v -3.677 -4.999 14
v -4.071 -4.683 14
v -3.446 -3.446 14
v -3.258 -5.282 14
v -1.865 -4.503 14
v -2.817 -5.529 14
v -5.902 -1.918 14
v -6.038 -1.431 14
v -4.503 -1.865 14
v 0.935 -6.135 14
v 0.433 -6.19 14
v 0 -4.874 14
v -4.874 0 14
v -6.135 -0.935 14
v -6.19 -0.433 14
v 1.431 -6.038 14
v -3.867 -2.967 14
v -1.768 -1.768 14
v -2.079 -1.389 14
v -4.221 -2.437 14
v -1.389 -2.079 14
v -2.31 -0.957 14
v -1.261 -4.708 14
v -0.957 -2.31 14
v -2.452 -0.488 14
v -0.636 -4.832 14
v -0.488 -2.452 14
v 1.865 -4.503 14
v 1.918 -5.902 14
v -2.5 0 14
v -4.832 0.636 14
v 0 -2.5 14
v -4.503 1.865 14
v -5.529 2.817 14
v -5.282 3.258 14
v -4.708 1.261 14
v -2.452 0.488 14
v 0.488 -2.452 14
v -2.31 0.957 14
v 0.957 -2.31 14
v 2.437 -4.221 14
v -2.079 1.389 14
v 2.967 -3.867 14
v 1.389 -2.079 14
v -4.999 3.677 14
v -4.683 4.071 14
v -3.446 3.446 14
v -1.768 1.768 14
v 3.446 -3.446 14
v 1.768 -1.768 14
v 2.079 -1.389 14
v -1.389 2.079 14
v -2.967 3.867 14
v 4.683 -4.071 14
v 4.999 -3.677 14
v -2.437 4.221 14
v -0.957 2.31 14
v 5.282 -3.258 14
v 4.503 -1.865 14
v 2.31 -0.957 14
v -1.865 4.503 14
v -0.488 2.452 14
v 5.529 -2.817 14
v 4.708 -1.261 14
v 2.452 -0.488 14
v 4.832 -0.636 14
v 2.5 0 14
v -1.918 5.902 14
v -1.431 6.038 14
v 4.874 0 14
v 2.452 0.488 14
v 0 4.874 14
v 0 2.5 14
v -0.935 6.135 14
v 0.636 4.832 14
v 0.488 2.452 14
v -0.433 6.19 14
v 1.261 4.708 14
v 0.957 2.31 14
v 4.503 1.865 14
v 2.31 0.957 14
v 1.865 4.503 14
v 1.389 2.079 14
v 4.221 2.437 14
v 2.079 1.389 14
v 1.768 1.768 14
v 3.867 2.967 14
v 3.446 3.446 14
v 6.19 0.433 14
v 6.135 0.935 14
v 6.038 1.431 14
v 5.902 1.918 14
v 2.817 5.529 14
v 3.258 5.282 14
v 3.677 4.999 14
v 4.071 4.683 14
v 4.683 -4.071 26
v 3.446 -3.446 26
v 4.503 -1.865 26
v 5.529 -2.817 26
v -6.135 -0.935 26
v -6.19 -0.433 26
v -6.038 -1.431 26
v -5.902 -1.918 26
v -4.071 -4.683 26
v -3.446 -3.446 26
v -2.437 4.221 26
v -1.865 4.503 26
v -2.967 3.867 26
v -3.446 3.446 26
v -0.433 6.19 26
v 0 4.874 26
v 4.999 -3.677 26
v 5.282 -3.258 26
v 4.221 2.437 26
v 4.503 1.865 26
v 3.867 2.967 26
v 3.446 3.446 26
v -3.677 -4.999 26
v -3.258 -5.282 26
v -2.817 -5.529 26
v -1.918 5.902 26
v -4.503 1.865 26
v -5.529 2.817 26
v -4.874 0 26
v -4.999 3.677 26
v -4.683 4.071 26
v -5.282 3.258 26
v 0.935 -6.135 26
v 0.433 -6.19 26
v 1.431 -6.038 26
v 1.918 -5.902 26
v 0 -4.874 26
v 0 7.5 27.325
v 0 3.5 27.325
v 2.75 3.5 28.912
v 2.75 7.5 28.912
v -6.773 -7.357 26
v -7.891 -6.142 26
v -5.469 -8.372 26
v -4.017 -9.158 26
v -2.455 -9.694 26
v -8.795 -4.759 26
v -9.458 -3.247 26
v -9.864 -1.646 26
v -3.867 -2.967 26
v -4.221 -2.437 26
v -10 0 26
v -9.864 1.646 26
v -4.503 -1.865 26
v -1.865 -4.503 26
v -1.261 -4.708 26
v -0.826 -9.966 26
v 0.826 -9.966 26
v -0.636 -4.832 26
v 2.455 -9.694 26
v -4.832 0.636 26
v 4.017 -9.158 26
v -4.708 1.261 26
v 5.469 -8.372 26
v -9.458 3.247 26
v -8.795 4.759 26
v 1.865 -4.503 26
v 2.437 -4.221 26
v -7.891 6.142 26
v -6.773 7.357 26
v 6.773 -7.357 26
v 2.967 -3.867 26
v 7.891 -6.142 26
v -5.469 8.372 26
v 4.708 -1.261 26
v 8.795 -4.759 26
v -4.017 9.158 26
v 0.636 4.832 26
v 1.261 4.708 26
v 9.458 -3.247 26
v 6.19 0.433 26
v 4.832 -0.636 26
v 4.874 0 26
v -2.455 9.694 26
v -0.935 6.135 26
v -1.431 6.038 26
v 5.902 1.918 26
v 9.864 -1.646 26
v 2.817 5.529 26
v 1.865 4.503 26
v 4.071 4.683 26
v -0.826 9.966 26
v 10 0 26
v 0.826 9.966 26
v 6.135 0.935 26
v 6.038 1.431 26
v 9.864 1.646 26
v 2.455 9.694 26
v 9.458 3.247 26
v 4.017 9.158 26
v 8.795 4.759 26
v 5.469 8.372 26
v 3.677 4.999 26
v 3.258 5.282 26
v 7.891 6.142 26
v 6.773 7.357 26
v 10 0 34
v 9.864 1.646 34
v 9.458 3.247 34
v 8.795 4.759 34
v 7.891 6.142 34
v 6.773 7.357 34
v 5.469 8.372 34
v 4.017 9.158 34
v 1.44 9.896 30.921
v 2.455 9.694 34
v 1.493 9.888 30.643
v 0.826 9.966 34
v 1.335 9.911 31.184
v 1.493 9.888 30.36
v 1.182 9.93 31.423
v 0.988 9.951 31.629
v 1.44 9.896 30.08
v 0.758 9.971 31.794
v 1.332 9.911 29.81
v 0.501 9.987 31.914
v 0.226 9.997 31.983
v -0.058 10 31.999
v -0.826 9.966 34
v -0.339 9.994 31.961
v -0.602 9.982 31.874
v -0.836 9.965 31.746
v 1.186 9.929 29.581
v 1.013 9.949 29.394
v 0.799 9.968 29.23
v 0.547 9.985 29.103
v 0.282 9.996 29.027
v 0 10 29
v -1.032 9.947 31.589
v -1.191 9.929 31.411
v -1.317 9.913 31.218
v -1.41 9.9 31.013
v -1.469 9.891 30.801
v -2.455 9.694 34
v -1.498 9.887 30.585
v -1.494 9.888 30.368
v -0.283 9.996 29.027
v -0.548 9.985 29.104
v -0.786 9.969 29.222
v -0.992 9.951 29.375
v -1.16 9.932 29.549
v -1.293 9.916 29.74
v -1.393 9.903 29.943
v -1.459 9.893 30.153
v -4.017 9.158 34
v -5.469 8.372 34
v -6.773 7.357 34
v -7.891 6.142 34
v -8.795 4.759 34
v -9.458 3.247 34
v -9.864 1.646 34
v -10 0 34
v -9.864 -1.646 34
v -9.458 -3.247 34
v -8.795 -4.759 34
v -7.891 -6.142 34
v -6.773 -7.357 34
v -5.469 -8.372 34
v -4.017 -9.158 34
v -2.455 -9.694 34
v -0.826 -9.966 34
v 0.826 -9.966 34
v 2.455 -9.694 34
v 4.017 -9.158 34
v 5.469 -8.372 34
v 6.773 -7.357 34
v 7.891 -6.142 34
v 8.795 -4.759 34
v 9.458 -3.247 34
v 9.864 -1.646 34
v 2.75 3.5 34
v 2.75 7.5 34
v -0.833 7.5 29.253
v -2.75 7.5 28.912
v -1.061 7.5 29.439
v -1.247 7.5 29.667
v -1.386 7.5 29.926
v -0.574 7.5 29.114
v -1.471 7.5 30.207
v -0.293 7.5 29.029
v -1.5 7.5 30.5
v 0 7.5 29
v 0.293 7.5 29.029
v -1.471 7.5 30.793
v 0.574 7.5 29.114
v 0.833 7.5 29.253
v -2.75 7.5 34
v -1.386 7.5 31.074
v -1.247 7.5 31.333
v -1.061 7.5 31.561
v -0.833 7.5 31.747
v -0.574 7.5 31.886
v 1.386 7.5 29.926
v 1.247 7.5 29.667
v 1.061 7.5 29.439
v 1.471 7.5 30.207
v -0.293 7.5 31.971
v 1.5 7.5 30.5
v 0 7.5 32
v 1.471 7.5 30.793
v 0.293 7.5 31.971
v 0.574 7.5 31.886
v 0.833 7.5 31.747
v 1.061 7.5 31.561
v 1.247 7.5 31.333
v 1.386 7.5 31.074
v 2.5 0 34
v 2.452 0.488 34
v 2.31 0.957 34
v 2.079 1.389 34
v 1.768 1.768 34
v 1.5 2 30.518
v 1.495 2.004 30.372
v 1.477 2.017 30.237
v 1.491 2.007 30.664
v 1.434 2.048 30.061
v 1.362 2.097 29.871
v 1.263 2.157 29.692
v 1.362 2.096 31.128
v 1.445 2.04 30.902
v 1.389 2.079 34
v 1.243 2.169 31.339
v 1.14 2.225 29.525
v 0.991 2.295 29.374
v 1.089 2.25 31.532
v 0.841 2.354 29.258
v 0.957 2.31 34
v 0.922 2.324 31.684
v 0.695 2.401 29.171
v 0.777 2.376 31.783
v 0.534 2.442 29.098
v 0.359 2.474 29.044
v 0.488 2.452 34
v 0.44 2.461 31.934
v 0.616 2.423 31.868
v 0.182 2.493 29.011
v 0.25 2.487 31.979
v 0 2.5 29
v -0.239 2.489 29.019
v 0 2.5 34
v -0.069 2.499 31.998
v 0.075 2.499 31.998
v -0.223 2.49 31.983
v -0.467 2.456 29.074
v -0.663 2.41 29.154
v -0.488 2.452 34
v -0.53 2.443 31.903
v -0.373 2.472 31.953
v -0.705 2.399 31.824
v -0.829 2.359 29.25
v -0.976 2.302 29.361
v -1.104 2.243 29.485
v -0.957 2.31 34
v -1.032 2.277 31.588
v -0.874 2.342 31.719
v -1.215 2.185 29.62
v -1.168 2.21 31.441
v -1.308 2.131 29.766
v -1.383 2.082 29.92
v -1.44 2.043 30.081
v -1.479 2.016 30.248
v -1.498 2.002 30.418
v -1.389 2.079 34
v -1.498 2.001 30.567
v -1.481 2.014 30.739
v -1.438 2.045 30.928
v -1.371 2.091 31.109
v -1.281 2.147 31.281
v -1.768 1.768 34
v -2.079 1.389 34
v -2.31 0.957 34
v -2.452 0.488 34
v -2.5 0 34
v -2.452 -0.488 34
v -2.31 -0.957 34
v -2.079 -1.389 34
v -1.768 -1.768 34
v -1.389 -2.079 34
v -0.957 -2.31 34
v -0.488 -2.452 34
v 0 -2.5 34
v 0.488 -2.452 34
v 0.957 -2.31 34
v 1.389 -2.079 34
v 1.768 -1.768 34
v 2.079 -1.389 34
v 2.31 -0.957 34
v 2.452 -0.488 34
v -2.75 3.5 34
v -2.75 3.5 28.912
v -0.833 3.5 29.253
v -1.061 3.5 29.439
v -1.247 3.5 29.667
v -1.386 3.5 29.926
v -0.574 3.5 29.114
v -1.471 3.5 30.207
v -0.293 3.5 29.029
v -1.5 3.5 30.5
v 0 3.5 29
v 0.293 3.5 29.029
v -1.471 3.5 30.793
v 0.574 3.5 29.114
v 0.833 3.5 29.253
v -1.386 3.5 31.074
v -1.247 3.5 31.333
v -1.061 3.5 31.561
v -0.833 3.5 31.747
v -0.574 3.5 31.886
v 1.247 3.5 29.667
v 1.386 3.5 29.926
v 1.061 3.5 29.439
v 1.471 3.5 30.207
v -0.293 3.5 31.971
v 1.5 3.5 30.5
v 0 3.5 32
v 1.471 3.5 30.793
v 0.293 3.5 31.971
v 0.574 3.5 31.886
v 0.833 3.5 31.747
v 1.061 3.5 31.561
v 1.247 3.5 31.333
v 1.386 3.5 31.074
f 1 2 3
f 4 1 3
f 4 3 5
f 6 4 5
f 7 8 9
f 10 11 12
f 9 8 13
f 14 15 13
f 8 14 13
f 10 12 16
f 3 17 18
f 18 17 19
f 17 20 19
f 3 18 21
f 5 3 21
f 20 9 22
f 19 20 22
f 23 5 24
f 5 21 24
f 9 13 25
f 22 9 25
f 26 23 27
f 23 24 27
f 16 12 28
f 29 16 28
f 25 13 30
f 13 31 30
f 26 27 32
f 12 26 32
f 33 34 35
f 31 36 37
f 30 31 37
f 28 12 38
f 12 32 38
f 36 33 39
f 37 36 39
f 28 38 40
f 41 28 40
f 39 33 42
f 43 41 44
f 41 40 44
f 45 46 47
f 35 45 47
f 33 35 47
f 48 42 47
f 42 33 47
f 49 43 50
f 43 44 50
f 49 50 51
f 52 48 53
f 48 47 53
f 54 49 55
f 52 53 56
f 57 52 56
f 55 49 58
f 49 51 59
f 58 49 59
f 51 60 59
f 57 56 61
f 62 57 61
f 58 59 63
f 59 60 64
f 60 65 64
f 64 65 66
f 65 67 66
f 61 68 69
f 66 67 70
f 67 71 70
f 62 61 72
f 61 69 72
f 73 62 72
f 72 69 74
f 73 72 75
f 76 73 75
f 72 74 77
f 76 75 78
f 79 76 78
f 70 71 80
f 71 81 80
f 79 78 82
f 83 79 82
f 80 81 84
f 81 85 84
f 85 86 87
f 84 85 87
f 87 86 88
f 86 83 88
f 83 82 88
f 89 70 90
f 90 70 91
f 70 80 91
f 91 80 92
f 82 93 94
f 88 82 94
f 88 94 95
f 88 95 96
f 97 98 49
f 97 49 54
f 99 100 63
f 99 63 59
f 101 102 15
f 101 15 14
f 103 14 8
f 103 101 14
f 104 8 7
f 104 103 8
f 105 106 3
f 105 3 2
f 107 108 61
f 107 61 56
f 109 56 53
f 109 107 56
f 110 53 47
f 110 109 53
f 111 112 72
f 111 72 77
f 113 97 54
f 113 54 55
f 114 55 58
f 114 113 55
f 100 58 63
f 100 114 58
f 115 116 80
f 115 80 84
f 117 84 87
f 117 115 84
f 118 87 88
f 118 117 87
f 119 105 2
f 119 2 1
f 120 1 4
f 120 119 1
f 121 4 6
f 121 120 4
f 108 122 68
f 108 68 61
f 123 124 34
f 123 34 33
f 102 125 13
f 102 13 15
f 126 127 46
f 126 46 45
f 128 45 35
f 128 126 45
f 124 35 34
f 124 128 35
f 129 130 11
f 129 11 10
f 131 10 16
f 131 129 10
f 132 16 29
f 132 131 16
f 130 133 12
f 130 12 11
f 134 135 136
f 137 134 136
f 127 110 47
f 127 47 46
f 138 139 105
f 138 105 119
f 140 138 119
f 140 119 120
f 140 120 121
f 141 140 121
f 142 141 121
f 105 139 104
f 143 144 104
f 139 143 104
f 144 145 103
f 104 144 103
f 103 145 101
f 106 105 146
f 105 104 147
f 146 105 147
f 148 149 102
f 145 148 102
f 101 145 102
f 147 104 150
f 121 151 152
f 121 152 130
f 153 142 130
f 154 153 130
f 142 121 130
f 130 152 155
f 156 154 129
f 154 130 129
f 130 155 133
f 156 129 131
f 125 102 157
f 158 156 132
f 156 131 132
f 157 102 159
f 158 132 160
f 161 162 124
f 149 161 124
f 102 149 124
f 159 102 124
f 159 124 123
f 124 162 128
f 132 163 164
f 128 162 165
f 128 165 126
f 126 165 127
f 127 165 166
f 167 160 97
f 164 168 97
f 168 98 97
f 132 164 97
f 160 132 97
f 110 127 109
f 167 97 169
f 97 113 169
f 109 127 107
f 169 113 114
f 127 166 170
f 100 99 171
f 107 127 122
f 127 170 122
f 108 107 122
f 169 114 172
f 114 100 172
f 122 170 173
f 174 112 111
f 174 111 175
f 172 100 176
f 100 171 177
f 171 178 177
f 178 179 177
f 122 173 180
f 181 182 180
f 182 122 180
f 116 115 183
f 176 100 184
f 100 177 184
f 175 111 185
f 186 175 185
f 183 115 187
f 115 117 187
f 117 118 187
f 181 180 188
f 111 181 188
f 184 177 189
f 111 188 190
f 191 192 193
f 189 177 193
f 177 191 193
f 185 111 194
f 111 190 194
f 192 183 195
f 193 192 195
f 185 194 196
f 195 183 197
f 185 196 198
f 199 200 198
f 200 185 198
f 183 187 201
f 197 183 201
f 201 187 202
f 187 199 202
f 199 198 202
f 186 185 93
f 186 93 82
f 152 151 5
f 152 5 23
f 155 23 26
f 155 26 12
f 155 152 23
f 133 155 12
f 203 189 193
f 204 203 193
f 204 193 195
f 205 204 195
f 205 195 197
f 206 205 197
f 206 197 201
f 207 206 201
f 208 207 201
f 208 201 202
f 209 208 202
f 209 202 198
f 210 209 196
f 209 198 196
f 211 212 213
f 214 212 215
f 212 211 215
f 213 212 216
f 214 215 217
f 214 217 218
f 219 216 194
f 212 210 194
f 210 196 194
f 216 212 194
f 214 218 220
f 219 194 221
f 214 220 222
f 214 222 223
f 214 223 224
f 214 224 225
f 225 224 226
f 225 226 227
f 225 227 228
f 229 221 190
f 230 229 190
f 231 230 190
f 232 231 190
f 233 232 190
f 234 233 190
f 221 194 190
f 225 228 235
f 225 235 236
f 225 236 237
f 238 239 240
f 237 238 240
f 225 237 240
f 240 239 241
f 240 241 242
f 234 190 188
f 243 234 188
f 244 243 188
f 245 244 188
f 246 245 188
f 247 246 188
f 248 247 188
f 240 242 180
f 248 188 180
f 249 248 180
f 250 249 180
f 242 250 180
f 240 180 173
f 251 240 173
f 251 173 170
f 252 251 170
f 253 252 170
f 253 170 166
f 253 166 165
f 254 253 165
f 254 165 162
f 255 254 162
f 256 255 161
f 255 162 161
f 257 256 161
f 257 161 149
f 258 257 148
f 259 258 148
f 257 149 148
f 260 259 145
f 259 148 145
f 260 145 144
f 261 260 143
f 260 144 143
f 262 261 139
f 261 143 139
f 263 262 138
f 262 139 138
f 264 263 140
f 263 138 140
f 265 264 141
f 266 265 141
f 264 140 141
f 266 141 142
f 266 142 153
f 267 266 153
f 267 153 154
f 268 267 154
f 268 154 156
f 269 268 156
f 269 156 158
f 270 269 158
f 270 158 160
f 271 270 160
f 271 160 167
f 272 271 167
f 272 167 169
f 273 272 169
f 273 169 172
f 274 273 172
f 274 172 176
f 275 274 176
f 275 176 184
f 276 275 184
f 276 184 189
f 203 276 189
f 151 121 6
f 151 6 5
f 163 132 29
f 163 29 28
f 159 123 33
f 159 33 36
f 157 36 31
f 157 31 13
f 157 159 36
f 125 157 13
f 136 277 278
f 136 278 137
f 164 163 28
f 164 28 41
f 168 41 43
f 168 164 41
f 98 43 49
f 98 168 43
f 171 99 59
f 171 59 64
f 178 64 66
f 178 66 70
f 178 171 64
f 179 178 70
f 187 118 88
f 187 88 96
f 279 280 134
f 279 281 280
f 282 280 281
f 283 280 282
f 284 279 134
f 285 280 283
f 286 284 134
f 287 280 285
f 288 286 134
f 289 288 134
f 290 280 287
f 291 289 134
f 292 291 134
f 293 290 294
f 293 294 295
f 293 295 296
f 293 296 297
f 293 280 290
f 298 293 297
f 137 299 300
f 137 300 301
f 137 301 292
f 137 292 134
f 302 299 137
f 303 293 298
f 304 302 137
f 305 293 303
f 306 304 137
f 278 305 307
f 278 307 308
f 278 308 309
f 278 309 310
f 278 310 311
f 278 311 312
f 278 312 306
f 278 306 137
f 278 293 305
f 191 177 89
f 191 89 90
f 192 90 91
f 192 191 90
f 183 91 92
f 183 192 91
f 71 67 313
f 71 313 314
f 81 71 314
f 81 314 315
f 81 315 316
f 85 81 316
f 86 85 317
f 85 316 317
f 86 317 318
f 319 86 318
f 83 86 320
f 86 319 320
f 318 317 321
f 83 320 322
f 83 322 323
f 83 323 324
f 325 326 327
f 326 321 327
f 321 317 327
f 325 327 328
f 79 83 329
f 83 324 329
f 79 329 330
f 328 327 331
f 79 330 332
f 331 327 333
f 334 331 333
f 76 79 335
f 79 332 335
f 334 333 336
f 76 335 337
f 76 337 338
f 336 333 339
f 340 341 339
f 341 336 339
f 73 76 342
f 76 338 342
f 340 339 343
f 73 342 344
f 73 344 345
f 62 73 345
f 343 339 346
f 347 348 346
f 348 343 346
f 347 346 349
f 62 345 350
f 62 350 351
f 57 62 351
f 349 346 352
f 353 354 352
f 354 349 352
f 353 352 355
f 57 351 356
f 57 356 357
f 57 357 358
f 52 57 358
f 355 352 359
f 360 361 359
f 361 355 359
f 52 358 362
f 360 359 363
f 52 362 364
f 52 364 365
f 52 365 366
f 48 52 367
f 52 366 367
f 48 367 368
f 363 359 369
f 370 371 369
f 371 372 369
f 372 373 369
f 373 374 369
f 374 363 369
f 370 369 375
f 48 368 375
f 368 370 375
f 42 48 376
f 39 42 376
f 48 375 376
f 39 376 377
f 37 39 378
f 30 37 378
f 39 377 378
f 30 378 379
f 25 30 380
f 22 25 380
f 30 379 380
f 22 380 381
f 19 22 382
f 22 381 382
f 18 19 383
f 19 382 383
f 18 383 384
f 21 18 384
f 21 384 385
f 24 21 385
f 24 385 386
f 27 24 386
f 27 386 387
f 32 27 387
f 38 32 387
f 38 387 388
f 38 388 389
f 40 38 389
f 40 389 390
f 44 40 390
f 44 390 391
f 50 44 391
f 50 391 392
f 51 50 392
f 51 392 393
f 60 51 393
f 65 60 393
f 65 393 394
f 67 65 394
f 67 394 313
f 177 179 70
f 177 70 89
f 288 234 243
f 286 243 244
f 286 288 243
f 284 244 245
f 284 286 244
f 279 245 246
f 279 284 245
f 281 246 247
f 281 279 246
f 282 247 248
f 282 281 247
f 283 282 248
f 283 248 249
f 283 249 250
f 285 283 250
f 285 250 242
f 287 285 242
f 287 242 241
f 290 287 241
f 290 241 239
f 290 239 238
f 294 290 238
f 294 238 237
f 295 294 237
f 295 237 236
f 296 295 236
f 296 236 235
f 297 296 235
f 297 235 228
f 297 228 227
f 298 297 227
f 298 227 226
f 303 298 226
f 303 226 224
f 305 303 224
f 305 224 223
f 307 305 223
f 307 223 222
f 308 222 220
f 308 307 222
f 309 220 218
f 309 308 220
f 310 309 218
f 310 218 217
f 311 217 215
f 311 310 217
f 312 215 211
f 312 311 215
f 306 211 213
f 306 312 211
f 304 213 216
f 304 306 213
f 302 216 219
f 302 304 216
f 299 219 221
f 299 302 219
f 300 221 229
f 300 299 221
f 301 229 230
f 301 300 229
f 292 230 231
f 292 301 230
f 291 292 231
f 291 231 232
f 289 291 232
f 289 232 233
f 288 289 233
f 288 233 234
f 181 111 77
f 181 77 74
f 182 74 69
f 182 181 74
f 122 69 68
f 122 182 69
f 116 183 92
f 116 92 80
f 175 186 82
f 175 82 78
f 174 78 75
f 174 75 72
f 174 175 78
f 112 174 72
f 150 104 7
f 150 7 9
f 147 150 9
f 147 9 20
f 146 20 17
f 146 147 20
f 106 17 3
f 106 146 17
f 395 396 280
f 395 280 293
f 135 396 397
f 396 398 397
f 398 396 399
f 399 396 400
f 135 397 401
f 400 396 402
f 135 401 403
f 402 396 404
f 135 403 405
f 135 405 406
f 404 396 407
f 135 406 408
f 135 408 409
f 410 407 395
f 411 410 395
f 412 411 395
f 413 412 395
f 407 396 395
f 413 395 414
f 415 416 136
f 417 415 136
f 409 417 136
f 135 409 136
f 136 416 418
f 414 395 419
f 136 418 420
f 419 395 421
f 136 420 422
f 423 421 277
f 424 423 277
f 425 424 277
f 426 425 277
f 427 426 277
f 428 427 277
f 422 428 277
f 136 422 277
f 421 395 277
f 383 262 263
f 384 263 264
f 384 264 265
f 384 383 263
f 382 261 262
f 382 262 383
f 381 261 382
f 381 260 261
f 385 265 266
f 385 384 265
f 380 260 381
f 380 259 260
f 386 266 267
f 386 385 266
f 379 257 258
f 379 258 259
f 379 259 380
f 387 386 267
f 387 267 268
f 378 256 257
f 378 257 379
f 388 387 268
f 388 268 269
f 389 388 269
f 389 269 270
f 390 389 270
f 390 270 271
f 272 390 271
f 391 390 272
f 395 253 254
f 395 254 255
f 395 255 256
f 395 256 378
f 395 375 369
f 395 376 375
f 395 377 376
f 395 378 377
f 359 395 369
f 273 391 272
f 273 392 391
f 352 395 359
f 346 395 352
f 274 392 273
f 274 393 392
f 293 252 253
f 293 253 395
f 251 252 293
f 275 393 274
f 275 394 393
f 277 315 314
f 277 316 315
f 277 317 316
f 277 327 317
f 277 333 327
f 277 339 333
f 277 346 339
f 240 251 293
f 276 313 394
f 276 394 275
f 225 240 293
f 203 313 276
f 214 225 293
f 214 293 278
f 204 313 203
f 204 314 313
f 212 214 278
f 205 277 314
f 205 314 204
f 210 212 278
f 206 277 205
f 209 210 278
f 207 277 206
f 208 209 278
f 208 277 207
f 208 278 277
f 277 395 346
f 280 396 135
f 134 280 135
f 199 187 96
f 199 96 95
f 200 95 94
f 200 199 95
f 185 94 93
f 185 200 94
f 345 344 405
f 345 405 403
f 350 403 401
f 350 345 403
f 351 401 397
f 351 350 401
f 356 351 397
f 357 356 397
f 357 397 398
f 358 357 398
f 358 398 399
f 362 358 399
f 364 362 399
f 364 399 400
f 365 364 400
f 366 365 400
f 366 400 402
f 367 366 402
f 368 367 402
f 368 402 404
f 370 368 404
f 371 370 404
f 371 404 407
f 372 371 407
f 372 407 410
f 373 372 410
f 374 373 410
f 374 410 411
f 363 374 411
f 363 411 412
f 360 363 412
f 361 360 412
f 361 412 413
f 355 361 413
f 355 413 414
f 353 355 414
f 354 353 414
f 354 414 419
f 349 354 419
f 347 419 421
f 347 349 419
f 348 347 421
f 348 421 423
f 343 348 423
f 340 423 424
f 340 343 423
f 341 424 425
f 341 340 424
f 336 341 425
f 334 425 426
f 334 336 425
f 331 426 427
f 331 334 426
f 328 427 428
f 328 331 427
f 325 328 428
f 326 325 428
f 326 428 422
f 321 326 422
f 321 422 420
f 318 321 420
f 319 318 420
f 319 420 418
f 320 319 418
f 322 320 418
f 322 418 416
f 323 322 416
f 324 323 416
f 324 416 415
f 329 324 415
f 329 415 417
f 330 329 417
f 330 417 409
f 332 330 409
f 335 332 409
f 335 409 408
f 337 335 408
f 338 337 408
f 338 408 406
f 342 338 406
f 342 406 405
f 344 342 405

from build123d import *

# Parameters (mm, degrees)
BOSS_EXTRUDE1_DEPTH          = 12
SKETCH2_R                    = 10
BOSS_EXTRUDE2_DEPTH          = 8
F_5_0_5_DIAMETER_HOLE1_D     = 5
F_5_0_5_DIAMETER_HOLE1_DEPTH = 25
F_5_0_5_DIAMETER_HOLE1_TIP   = 1.502151548
SKETCH6_R                    = 1.5
CUT_EXTRUDE1_DEPTH           = 11
SKETCH8_R                    = 1.5
CUT_EXTRUDE2_DEPTH           = 4


with BuildPart() as part:
    # Sketch1 → Boss-Extrude1 (new body)
    with BuildSketch(Plane.XY.offset(26)):
        with BuildLine():
            Line((4.873707659, 0), (6.190281068, 0.43286662))
            ThreePointArc((6.190281068, 0.43286662), (6.091386481, 1.184045587), (5.901683351, 1.917573162))
            Line((5.901683351, 1.917573162), (4.502718754, 1.865087175))
            ThreePointArc((4.502718754, 1.865087175), (4.052339818, 2.7076869), (3.446231735, 3.446231735))
            Line((3.446231735, 3.446231735), (4.071106798, 4.683272643))
            ThreePointArc((4.071106798, 4.683272643), (3.470014023, 5.144507351), (2.817191332, 5.529049304))
            Line((2.817191332, 5.529049304), (1.865087175, 4.502718754))
            ThreePointArc((1.865087175, 4.502718754), (0.950813197, 4.780060733), (0, 4.873707659))
            Line((0, 4.873707659), (-0.43286662, 6.190281068))
            ThreePointArc((-0.43286662, 6.190281068), (-1.184045587, 6.091386481), (-1.917573162, 5.901683351))
            Line((-1.917573162, 5.901683351), (-1.865087175, 4.502718754))
            ThreePointArc((-1.865087175, 4.502718754), (-2.7076869, 4.052339818), (-3.446231735, 3.446231735))
            Line((-3.446231735, 3.446231735), (-4.683272643, 4.071106798))
            ThreePointArc((-4.683272643, 4.071106798), (-5.144507351, 3.470014023), (-5.529049304, 2.817191332))
            Line((-5.529049304, 2.817191332), (-4.502718754, 1.865087175))
            ThreePointArc((-4.502718754, 1.865087175), (-4.780060733, 0.950813197), (-4.873707659, 0))
            Line((-4.873707659, 0), (-6.190281068, -0.43286662))
            ThreePointArc((-6.190281068, -0.43286662), (-6.091386481, -1.184045587), (-5.901683351, -1.917573162))
            Line((-5.901683351, -1.917573162), (-4.502718754, -1.865087175))
            ThreePointArc((-4.502718754, -1.865087175), (-4.052339818, -2.7076869), (-3.446231735, -3.446231735))
            Line((-3.446231735, -3.446231735), (-4.071106798, -4.683272643))
            ThreePointArc((-4.071106798, -4.683272643), (-3.470014023, -5.144507351), (-2.817191332, -5.529049304))
            Line((-2.817191332, -5.529049304), (-1.865087175, -4.502718754))
            ThreePointArc((-1.865087175, -4.502718754), (-0.950813197, -4.780060733), (0, -4.873707659))
            Line((0, -4.873707659), (0.43286662, -6.190281068))
            ThreePointArc((0.43286662, -6.190281068), (1.184045587, -6.091386481), (1.917573162, -5.901683351))
            Line((1.917573162, -5.901683351), (1.865087175, -4.502718754))
            ThreePointArc((1.865087175, -4.502718754), (2.7076869, -4.052339818), (3.446231735, -3.446231735))
            Line((3.446231735, -3.446231735), (4.683272643, -4.071106798))
            ThreePointArc((4.683272643, -4.071106798), (5.144507351, -3.470014023), (5.529049304, -2.817191332))
            Line((5.529049304, -2.817191332), (4.502718754, -1.865087175))
            ThreePointArc((4.502718754, -1.865087175), (4.780060733, -0.950813197), (4.873707659, 0))
        make_face()
    extrude(amount=-BOSS_EXTRUDE1_DEPTH)

    # Sketch2 → Boss-Extrude2 (add)
    with BuildSketch(Plane.XY.offset(26)):
        Circle(SKETCH2_R)
    extrude(amount=BOSS_EXTRUDE2_DEPTH)

    # Ø5.0 (5) Diameter Hole1
    with Locations(Plane(origin=(0, 0, 14), x_dir=(-1, 0, 0), z_dir=(0, 0, -1))):
        with Locations((0, 0)):
            Hole(F_5_0_5_DIAMETER_HOLE1_D / 2, depth=F_5_0_5_DIAMETER_HOLE1_DEPTH)
            with Locations((0, 0, -(F_5_0_5_DIAMETER_HOLE1_DEPTH + F_5_0_5_DIAMETER_HOLE1_TIP / 2))):  # 118° drill point
                Cone(0, F_5_0_5_DIAMETER_HOLE1_D / 2, F_5_0_5_DIAMETER_HOLE1_TIP, mode=Mode.SUBTRACT)

    # Sketch6 → Cut-Extrude1 (cut)
    with BuildSketch(Plane(origin=(0, 0, 0), x_dir=(1, 0, 0), z_dir=(0, 1, 0))):
        with Locations(Location((0, -30.5, 0), (0, 0, 90))):
            Circle(SKETCH6_R)
    extrude(amount=CUT_EXTRUDE1_DEPTH, mode=Mode.SUBTRACT)

    # Sketch8 → Cut-Extrude2 (cut)
    with BuildSketch(Plane(origin=(0, 3.5, 0), x_dir=(-1, 0, 0), z_dir=(0, 1, 0))):
        Polygon((-2.75, 32.08771324), (-2.75, 34), (2.75, 34), (2.75, 32.08771324), (2.75, 28.91228676), (0, 27.324573519), (-2.75, 28.91228676), align=None)
        with Locations(Location((0, 30.5, 0), (0, 0, 270))):
            Circle(SKETCH8_R, mode=Mode.SUBTRACT)
    extrude(amount=CUT_EXTRUDE2_DEPTH, mode=Mode.SUBTRACT)


solid = part.part
